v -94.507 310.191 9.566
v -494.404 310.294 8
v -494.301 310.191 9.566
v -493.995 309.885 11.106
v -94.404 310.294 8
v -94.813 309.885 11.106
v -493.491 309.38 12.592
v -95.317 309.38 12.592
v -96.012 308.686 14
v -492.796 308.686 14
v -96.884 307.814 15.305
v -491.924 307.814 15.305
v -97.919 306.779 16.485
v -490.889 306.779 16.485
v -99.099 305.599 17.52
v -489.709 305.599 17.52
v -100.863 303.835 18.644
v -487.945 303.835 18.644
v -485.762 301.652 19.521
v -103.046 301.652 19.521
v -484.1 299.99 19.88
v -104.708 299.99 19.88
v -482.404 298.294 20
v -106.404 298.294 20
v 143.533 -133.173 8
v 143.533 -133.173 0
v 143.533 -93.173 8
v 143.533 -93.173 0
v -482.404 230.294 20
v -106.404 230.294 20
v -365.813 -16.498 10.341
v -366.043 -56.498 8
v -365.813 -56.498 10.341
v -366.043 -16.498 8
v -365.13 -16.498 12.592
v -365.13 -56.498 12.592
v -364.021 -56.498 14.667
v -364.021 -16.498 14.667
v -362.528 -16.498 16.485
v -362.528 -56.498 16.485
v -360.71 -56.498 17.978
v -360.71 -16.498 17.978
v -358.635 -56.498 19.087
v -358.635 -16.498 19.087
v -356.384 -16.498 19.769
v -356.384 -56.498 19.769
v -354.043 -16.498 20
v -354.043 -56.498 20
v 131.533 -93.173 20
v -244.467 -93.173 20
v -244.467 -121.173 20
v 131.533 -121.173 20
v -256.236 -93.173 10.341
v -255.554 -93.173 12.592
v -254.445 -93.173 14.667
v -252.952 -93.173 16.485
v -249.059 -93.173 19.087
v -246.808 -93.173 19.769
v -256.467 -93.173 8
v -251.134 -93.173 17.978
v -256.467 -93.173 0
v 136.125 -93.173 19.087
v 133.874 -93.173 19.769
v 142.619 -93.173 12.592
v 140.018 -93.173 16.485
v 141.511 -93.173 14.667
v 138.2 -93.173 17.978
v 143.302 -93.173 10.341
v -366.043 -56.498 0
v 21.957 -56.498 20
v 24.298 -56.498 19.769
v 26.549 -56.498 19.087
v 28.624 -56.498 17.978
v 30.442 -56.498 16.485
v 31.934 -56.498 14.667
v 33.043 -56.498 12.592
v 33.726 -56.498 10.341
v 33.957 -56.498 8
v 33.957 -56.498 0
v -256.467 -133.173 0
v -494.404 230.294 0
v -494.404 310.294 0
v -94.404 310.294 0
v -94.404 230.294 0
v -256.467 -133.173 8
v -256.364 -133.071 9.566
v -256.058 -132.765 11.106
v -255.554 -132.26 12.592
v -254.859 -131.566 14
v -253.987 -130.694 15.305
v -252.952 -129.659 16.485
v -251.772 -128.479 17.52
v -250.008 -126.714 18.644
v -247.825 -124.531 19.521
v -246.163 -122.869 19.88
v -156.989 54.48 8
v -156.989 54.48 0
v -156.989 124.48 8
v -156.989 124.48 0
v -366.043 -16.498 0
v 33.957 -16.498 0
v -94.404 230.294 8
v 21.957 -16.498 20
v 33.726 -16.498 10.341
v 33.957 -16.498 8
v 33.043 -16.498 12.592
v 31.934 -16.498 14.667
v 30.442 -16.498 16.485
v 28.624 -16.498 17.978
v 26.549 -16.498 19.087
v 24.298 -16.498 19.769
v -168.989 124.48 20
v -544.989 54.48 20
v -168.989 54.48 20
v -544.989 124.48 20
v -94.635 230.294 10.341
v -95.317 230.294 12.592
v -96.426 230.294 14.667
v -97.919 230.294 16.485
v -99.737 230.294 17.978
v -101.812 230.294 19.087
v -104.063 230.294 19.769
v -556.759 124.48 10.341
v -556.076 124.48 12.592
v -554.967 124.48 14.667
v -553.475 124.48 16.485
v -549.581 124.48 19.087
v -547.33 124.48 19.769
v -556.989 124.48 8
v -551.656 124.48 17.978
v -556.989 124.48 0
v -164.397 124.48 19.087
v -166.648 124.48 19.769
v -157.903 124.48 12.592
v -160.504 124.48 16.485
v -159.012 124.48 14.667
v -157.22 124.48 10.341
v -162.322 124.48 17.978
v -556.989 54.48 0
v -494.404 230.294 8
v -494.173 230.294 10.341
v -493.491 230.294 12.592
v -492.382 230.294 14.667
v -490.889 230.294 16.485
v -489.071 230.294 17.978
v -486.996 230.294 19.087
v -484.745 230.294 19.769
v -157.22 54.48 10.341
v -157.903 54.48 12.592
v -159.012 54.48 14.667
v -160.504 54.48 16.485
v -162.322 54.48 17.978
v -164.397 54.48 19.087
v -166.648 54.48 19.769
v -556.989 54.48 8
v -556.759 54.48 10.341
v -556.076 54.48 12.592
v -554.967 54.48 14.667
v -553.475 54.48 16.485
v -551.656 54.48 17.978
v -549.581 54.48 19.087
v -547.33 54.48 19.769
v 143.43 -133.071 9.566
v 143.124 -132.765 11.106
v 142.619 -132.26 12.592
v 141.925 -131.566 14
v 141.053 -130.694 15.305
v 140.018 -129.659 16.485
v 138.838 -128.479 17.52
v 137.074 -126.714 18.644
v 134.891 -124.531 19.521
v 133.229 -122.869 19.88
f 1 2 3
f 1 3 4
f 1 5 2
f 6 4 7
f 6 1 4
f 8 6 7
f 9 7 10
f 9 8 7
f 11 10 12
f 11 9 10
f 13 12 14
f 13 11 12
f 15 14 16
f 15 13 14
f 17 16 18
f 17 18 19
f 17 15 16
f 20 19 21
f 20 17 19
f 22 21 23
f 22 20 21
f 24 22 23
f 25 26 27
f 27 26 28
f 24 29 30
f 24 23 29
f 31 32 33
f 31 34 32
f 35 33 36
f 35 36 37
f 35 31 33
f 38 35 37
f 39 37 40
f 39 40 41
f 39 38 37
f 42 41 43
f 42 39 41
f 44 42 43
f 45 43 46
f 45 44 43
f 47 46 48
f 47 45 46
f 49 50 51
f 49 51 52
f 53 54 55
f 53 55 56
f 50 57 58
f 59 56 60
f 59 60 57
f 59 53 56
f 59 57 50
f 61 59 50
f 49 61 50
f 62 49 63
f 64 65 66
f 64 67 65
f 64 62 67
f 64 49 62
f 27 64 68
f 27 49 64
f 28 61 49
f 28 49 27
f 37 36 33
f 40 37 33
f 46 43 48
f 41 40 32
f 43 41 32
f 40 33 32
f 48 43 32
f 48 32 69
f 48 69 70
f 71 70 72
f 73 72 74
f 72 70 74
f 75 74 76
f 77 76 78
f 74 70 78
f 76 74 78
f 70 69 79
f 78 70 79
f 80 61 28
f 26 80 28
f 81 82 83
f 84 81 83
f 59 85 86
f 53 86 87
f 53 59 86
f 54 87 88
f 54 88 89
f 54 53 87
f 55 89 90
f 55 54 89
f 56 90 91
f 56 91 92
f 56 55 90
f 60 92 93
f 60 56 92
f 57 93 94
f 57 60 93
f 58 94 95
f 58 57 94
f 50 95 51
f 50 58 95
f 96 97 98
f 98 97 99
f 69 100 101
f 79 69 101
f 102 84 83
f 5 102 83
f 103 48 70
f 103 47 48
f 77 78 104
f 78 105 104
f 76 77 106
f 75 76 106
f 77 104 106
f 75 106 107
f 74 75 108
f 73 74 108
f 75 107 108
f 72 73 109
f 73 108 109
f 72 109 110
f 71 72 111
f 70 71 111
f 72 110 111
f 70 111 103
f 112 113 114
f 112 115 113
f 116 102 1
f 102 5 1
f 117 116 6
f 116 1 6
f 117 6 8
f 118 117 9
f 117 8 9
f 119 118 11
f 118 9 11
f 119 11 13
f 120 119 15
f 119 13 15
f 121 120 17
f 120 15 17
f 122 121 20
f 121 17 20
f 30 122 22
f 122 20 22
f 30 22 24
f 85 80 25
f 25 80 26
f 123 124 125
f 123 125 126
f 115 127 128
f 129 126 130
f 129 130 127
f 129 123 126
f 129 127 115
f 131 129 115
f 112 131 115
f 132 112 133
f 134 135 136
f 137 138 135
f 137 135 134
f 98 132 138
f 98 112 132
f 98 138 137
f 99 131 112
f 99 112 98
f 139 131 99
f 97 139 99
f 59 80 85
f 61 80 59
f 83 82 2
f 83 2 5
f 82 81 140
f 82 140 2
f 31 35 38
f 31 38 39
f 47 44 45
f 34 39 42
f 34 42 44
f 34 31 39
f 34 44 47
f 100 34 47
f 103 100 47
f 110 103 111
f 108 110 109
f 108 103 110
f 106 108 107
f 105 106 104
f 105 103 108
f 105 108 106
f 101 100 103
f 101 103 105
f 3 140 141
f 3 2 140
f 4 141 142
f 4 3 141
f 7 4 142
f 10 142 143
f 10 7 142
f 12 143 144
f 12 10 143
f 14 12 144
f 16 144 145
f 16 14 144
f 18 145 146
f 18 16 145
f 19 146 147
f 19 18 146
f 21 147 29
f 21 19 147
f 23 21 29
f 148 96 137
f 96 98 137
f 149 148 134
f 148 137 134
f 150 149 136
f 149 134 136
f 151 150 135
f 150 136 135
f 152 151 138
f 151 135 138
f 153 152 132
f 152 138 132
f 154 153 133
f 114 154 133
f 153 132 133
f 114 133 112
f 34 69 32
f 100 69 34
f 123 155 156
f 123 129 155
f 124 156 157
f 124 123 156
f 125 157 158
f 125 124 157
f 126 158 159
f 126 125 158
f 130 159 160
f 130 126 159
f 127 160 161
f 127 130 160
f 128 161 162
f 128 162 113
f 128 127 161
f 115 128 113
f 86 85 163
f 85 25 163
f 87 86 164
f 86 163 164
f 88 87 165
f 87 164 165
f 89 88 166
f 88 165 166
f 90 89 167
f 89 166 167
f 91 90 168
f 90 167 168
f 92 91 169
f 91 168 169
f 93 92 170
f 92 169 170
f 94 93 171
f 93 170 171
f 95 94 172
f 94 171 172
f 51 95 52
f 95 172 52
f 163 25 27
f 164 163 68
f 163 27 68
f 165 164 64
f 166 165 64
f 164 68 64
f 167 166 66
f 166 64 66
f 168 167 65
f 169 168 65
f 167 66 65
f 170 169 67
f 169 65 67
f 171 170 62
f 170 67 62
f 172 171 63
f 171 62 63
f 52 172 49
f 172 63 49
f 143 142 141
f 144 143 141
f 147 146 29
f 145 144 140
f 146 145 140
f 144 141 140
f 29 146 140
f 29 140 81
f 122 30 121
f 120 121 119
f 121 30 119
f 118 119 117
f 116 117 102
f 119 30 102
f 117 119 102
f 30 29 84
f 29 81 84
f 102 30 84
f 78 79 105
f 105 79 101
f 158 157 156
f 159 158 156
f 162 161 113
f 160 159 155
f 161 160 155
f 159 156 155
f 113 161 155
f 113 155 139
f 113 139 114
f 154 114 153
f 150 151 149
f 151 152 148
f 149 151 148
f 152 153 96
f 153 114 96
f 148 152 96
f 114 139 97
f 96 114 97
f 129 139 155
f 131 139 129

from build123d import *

# Parameters (mm, degrees)
F0_W     = 400
F0_H     = 40
F4_DEPTH = 20
F1_W     = 400
F1_H     = 40
F5_DEPTH = 20
F2_W     = 400
F2_H     = 70
F6_DEPTH = 20
F3_W     = 400
F3_H     = 80
F7_DEPTH = 20
F8_R     = 12
F8_2_R   = 12
F8_3_R   = 12
F8_4_R   = 12


with BuildPart() as f4:
    # F0 (on Top) → F4 (new body)
    with BuildSketch(Plane.XY):
        with Locations((-56.467072, -113.173482)):
            Rectangle(F0_W, F0_H)
    extrude(amount=F4_DEPTH)

    # F8#4
    f8_4_edges = [f4.edges().sort_by_distance(p)[0] for p in [
        (-256.467072, -113.173482, 20),
        (143.532928, -113.173482, 20),
        (-56.467072, -133.173482, 20),
    ]]
    fillet(f8_4_edges, radius=F8_4_R)


with BuildPart() as f5:
    # F1 (on Top) → F5 (new body)
    with BuildSketch(Plane.XY):
        with Locations((-166.04317, -36.497839)):
            Rectangle(F1_W, F1_H)
    extrude(amount=F5_DEPTH)

    # F8#3
    f8_3_edges = [f5.edges().sort_by_distance(p)[0] for p in [
        (-366.04317, -36.497839, 20),
        (33.95683, -36.497839, 20),
    ]]
    fillet(f8_3_edges, radius=F8_3_R)


with BuildPart() as f6:
    # F2 (on Top) → F6 (new body)
    with BuildSketch(Plane.XY):
        with Locations((-356.989252, 89.480467)):
            Rectangle(F2_W, F2_H)
    extrude(amount=F6_DEPTH)

    # F8#2
    f8_2_edges = [f6.edges().sort_by_distance(p)[0] for p in [
        (-556.989252, 89.480467, 20),
        (-156.989252, 89.480467, 20),
    ]]
    fillet(f8_2_edges, radius=F8_2_R)


with BuildPart() as f7:
    # F3 (on Top) → F7 (new body)
    with BuildSketch(Plane.XY):
        with Locations((-294.404037, 270.293728)):
            Rectangle(F3_W, F3_H)
    extrude(amount=F7_DEPTH)

    # F8
    f8_edges = [f7.edges().sort_by_distance(p)[0] for p in [
        (-294.404037, 310.293728, 20),
        (-94.404037, 270.293728, 20),
        (-494.404037, 270.293728, 20),
    ]]
    fillet(f8_edges, radius=F8_R)


solid = Compound([f4.part, f5.part, f6.part, f7.part])
